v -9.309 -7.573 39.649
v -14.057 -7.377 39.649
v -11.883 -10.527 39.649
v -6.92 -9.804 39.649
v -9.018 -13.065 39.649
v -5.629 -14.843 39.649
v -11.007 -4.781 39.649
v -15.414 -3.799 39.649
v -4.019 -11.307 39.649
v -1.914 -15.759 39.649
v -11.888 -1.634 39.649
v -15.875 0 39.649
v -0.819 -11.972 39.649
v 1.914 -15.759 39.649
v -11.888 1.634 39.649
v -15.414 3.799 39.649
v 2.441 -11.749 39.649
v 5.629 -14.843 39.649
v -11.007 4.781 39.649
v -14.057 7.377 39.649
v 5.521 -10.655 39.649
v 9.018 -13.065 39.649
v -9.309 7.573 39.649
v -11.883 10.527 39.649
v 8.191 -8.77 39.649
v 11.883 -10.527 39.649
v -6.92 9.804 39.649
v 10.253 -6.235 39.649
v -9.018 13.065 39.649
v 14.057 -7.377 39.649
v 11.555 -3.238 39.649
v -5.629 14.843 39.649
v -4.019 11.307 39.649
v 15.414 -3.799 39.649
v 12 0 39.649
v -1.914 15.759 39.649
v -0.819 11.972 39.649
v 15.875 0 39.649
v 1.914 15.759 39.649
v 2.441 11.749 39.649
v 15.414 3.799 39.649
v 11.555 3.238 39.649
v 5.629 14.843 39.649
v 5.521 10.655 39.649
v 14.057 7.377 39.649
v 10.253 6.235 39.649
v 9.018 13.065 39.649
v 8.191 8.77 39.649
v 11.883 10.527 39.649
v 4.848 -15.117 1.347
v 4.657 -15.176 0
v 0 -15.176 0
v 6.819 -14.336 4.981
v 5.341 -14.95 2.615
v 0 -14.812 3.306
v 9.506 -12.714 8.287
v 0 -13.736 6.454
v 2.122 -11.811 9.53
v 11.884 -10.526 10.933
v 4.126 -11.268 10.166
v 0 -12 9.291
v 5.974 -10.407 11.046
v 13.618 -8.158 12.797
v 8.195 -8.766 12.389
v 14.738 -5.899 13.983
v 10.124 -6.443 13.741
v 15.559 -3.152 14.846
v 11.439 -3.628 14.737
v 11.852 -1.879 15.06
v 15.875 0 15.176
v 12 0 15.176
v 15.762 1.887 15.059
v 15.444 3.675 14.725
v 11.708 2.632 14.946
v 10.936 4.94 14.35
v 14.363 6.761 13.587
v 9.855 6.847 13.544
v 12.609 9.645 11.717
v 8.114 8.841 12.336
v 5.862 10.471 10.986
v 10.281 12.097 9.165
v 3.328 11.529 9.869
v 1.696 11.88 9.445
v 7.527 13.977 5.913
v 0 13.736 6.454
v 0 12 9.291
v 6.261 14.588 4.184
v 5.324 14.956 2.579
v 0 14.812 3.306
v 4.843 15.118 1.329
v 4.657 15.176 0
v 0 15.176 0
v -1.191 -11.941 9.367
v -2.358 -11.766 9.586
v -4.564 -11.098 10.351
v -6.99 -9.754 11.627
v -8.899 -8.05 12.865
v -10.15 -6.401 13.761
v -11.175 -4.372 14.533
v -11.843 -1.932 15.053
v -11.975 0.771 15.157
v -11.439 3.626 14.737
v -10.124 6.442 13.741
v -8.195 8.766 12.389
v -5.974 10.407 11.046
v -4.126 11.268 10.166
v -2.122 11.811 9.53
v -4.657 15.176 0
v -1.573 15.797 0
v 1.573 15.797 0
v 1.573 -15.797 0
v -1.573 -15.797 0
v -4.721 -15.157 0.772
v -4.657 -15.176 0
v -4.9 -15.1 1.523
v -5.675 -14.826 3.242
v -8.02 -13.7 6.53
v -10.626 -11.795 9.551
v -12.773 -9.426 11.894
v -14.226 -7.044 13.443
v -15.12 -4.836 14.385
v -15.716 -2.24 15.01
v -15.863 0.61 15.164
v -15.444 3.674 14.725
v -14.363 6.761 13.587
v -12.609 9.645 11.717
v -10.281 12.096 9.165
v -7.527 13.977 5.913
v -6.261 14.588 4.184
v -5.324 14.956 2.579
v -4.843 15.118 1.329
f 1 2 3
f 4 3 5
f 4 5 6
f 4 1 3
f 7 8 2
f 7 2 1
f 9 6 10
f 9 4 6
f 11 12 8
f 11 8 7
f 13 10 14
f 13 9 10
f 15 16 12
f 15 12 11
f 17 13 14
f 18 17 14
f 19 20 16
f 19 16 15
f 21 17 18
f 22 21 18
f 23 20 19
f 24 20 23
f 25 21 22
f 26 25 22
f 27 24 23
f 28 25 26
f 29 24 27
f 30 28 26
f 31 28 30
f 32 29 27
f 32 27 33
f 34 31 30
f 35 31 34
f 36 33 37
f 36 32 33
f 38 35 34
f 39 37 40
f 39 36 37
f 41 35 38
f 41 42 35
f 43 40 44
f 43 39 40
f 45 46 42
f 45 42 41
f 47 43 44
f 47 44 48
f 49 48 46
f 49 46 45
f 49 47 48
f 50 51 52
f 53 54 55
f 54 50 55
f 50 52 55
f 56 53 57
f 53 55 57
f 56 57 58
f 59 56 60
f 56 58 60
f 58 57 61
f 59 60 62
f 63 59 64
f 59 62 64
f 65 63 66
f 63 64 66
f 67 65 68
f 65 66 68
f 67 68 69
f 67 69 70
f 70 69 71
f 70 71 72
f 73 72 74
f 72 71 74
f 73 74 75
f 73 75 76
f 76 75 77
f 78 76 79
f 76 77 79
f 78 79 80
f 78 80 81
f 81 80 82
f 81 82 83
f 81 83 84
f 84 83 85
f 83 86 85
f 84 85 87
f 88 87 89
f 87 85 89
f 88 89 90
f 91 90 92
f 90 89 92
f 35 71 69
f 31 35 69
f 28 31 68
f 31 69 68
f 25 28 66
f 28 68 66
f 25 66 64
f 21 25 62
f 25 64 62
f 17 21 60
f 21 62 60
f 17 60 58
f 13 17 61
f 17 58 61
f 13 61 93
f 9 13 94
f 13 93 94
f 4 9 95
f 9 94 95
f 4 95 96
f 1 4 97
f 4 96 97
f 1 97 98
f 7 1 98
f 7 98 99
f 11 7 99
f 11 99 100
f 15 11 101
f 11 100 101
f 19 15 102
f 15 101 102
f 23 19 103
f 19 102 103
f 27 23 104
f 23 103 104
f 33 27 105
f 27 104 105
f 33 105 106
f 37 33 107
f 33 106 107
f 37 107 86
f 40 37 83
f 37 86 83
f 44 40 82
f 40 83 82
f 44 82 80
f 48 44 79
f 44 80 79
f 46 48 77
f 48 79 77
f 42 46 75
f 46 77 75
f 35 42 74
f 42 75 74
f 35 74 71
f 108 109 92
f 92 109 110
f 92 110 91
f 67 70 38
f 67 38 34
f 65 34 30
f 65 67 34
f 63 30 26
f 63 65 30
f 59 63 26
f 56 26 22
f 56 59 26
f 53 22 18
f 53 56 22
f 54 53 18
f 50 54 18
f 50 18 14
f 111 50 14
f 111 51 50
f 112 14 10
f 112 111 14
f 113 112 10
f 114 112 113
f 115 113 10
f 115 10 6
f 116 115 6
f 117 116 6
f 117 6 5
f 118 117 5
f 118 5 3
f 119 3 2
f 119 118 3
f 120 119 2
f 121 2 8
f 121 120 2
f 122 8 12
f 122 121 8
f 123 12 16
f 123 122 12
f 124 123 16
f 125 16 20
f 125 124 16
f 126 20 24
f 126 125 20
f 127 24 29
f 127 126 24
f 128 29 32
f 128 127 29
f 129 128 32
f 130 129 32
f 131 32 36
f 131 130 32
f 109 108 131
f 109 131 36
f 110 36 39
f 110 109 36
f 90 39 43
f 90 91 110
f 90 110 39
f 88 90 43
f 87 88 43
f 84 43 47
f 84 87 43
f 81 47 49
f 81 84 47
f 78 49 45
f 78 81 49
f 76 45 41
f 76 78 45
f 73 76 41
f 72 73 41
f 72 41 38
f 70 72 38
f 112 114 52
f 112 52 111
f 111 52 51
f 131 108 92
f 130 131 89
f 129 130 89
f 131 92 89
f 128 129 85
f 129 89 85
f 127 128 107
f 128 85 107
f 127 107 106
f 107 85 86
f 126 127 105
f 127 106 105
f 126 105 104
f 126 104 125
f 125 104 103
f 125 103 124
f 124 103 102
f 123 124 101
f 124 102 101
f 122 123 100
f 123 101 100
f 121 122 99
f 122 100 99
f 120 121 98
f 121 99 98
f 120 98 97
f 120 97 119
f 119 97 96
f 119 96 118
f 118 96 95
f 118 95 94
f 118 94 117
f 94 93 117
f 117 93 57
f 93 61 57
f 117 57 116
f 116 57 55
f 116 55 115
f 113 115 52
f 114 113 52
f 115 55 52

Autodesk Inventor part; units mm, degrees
ref_plane "YZ Plane" through (0, 0, 0) normal (1, 0, 0) x (0, 1, 0)
ref_plane "XZ Plane" through (0, 0, 0) normal (0, 1, 0) x (-1, 0, 0)
ref_plane "XY Plane" through (0, 0, 0) normal (0, 0, 1) x (1, 0, 0)
sketch "Sketch1" plane through (0, 0, 0) normal (0, 0, 1) x (1, 0, 0)
  circle A0 centre (0, 0) radius 15.875
  circle A1 centre (0, 0) radius 12
  dimension "d0" = 31.75
  dimension "d1" = 24
extrude "Extrusion1" add sketch "Sketch1" along normal blind 39.6494
sketch "Sketch2" plane through (0, 0, 0) normal (1, 0, 0) x (0, 1, 0)
  circle A0 centre (0, 0) radius 15.1765
  dimension "d4" = 30.353
extrude "Extrusion2" cut sketch "Sketch2" along normal through all both and the other way through all
properties part number "DPLX_P019_Camera Shroud_RevA" material "Aluminum 6061"
